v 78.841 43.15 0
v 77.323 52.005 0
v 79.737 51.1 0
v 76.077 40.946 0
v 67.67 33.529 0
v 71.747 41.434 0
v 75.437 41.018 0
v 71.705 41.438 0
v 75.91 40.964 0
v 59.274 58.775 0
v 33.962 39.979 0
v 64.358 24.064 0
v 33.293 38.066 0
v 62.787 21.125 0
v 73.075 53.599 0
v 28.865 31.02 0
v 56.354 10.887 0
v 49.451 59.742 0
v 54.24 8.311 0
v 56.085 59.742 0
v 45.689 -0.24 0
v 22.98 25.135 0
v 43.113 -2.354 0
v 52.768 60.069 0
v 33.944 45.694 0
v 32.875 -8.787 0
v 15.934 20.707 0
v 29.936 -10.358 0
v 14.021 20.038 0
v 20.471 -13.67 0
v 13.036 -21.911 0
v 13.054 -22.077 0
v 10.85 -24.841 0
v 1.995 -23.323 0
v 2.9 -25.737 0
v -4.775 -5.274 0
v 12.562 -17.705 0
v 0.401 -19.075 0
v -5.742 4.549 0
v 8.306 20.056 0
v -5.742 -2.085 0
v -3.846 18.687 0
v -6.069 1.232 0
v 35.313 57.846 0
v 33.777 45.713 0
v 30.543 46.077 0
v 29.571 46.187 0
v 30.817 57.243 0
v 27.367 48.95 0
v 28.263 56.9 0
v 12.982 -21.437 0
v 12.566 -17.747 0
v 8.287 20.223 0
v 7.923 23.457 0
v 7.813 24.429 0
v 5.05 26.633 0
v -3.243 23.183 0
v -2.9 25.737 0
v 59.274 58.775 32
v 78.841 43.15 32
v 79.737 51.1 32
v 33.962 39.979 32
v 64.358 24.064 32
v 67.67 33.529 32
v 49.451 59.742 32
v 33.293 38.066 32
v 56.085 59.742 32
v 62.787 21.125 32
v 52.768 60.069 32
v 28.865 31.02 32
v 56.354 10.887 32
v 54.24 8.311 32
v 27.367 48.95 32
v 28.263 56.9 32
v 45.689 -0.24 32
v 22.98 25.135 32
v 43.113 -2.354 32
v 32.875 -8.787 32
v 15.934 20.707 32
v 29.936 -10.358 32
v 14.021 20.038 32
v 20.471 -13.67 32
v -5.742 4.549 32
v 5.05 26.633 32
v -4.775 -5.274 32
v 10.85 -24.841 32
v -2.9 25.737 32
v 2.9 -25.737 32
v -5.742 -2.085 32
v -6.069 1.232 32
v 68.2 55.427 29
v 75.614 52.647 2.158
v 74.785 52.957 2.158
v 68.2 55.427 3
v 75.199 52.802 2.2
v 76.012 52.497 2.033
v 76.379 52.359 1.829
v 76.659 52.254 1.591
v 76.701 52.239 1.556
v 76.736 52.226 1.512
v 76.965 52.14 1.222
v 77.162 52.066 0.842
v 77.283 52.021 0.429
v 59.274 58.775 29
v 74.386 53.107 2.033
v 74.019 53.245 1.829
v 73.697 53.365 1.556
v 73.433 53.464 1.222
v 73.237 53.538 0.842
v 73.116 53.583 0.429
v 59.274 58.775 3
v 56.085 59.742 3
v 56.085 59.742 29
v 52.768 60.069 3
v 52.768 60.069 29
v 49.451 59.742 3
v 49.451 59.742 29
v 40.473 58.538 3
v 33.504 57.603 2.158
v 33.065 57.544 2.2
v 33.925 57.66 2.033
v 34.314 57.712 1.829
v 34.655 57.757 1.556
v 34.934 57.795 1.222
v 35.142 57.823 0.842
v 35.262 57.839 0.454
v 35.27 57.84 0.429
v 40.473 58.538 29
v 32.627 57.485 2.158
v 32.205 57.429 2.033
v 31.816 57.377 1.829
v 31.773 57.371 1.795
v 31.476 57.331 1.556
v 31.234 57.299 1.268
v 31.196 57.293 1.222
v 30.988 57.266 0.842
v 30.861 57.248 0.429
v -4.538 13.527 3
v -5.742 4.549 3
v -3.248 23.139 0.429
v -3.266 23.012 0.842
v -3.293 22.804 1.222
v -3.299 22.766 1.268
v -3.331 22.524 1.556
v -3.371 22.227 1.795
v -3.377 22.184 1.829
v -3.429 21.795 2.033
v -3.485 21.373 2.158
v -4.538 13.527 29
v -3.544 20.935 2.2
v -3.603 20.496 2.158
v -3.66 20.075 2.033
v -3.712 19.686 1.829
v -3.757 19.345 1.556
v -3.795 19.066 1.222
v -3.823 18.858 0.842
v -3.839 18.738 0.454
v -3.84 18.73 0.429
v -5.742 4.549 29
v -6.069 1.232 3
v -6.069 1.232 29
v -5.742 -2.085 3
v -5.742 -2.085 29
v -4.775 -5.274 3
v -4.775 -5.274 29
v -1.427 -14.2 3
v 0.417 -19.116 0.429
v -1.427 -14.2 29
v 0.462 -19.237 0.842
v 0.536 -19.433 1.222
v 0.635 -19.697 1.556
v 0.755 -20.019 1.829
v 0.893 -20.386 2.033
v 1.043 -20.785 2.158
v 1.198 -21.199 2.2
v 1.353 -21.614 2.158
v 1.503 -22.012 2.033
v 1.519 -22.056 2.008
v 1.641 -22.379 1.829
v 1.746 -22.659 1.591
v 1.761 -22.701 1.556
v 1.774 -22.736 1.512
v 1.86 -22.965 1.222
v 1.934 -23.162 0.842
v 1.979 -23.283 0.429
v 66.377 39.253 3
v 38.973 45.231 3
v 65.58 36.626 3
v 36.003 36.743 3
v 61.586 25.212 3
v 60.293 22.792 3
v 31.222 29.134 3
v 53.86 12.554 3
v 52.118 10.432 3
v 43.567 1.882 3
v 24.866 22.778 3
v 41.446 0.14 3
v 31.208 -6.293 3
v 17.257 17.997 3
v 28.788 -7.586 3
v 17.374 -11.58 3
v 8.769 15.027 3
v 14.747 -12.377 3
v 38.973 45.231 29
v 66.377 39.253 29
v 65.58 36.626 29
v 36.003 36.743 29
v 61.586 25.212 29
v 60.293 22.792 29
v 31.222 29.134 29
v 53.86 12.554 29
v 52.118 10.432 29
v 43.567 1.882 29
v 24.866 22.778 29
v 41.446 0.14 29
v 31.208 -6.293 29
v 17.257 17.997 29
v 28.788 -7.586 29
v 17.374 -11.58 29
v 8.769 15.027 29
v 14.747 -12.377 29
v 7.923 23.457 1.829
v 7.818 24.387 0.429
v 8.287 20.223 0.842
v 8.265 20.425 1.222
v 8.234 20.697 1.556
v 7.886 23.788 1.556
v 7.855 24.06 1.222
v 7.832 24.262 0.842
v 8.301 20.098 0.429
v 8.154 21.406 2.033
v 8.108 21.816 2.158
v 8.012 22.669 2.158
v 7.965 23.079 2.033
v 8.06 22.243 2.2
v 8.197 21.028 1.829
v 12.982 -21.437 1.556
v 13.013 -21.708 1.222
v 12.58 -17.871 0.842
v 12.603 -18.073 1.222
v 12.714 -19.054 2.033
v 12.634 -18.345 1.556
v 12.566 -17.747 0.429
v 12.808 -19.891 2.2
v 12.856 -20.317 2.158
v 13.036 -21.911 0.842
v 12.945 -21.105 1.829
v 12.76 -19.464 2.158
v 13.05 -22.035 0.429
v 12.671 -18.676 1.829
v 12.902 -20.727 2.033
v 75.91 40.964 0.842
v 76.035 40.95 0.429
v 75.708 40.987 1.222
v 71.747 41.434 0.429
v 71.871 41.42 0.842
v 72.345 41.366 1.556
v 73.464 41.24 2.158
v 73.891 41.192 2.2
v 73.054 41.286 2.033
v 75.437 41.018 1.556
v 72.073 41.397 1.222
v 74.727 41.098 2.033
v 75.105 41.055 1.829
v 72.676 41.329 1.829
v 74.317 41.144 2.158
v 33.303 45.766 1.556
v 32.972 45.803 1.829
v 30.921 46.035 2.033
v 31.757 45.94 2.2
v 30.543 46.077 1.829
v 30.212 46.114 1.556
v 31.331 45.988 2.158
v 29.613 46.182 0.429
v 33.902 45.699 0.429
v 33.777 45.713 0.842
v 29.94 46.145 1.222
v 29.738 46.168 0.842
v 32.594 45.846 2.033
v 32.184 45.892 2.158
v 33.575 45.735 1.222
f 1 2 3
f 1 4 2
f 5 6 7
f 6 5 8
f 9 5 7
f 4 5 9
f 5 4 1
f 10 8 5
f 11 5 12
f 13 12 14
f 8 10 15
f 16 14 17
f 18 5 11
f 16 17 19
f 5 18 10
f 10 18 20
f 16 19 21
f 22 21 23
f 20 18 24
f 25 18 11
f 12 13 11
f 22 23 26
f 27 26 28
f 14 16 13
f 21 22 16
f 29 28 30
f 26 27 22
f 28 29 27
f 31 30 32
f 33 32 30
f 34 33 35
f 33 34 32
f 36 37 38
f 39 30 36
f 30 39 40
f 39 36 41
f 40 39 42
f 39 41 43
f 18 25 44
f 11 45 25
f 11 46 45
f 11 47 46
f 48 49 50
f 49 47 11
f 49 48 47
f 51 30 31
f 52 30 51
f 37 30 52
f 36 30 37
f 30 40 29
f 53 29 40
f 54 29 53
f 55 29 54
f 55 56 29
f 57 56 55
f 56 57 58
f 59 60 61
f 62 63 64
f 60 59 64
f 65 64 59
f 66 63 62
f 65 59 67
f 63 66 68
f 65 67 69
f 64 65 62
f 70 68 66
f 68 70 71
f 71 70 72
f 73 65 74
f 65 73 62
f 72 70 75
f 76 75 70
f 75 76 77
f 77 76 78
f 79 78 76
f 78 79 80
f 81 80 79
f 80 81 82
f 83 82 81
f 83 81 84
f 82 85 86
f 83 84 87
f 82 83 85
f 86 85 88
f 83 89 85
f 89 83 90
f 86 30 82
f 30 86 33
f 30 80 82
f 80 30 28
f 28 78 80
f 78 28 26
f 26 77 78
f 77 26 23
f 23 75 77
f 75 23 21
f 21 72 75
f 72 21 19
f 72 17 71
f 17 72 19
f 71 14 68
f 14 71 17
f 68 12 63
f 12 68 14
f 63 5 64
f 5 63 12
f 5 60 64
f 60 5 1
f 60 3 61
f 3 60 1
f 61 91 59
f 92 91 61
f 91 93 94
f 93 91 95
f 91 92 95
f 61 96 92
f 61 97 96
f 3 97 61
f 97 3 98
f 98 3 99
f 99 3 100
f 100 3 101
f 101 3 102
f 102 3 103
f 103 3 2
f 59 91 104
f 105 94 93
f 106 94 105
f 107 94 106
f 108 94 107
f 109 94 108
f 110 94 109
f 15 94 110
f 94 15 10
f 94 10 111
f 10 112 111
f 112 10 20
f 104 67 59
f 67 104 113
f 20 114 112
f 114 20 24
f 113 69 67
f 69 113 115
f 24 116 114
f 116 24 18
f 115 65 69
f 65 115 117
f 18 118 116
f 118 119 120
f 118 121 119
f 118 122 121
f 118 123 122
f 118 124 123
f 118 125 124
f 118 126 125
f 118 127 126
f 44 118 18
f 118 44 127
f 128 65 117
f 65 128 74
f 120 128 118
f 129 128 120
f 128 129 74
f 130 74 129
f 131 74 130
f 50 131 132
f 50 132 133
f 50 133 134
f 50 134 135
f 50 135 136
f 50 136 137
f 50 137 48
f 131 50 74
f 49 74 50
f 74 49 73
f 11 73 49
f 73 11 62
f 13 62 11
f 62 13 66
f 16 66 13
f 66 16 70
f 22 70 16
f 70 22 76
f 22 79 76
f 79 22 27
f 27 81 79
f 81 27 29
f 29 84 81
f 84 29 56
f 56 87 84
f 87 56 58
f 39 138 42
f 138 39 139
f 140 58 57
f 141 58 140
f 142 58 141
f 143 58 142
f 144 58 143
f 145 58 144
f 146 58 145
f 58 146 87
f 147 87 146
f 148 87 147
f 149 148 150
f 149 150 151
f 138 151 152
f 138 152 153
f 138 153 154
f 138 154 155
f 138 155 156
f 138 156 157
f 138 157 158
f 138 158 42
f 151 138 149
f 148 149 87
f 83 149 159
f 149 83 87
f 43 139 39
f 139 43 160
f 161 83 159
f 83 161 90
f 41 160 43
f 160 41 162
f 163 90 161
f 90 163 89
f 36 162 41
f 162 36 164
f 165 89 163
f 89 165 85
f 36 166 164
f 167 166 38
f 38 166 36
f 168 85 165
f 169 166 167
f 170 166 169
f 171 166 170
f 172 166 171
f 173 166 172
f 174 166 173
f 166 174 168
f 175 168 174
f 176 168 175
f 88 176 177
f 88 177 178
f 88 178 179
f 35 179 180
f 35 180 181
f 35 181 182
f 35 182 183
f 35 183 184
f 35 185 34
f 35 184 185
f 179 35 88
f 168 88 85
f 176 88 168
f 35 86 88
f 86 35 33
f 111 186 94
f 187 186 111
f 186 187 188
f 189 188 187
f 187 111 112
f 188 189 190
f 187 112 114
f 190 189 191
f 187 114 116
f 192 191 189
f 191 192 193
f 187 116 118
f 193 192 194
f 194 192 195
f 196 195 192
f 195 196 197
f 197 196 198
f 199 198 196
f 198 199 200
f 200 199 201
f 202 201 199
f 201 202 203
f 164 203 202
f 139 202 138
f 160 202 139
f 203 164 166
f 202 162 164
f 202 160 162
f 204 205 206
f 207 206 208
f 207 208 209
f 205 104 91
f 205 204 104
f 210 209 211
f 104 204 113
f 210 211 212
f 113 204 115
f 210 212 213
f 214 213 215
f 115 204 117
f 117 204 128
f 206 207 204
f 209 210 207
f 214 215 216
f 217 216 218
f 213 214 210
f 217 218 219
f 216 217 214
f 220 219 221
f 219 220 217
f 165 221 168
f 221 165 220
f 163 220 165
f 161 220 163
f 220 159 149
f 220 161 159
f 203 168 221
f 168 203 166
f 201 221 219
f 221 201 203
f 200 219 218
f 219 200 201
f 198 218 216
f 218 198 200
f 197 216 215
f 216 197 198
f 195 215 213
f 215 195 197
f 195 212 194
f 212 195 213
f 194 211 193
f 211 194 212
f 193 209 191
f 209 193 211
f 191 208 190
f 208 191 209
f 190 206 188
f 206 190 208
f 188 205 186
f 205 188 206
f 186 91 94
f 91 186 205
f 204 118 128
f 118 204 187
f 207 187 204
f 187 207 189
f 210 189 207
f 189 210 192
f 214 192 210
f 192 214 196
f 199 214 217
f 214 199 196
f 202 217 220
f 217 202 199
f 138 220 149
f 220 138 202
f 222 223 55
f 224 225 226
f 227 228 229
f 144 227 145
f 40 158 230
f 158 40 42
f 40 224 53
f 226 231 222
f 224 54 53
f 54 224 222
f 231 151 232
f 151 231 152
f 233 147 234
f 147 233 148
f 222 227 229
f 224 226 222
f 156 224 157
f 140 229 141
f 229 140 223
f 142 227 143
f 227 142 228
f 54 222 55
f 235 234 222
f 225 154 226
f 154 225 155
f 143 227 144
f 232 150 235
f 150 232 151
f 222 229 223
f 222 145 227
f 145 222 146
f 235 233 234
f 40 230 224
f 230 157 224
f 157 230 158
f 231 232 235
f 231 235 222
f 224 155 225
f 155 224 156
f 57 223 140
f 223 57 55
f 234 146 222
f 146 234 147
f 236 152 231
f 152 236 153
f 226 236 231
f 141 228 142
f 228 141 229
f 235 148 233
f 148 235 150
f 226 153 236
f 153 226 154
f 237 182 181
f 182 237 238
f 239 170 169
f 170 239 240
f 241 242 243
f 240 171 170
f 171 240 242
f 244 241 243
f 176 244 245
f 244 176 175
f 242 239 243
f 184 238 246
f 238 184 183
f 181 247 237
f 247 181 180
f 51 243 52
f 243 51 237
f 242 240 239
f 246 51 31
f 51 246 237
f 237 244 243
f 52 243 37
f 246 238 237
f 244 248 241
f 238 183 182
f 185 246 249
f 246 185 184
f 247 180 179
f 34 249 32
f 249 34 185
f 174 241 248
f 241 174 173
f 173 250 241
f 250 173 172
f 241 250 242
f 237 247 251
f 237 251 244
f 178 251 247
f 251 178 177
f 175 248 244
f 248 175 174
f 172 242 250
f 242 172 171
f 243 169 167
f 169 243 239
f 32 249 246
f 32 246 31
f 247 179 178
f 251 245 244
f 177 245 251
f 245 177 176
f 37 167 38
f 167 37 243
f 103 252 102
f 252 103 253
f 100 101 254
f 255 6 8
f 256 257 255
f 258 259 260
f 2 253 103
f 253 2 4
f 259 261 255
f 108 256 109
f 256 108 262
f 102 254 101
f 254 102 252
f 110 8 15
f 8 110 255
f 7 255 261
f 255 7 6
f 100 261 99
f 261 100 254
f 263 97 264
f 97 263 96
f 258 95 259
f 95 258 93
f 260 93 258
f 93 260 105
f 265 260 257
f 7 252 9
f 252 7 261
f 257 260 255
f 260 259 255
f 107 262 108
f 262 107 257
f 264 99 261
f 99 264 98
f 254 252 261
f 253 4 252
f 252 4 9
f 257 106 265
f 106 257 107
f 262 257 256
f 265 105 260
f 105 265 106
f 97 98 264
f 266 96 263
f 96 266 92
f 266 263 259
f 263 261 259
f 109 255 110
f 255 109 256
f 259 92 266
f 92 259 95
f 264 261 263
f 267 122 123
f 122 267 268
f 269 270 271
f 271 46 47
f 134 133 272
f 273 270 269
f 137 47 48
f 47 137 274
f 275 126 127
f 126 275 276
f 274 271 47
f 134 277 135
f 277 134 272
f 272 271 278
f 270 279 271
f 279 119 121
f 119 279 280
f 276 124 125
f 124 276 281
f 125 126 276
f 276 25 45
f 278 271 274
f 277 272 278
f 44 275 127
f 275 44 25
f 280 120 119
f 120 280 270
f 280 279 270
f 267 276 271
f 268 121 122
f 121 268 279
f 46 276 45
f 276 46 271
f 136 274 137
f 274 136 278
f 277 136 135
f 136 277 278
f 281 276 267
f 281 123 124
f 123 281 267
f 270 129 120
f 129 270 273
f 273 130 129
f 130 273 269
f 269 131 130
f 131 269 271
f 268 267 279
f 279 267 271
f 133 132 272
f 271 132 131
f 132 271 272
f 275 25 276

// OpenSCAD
$fn = 32;

// ----------------------------------------------------------------------
// Air duct: 34 mm duct, 3 mm wall, 32 mm across
// ----------------------------------------------------------------------

// --- parameters (mm) ---
duct_r = 17;              // duct core radius
duct_d = 34;              // duct core diameter
wall = 3;                 // duct wall thickness
height = 32;              // duct width (extrusion height)
port_r = 25.9;            // port flange half width
port_d = 51.8;            // port flange width
port_t = 8;               // port flange thickness
bolt_d = 4.4;             // port bolt holes
bolt_offset = 21.2;       // bolt hole offset from the port axis

difference() {
  /* outer hull chain: tube with a flat flange plate at every port */
  linear_extrude(height = 32) {
    hull() {
      polygon([[2.9, -25.737], [-2.9, 25.737], [5.05, 26.633], [10.85, -24.841]]);
      translate([10.931, 1.232]) circle(r = 17);
    }
    hull() {
      translate([10.931, 1.232]) circle(r = 17);
      translate([12.016, 1.354]) circle(r = 17);
    }
    hull() {
      translate([12.016, 1.354]) circle(r = 17);
      translate([23.43, 5.348]) circle(r = 17);
    }
    hull() {
      translate([23.43, 5.348]) circle(r = 17);
      translate([33.668, 11.781]) circle(r = 17);
    }
    hull() {
      translate([33.668, 11.781]) circle(r = 17);
      translate([42.219, 20.332]) circle(r = 17);
    }
    hull() {
      translate([42.219, 20.332]) circle(r = 17);
      translate([48.652, 30.57]) circle(r = 17);
    }
    hull() {
      translate([48.652, 30.57]) circle(r = 17);
      translate([52.646, 41.984]) circle(r = 17);
    }
    hull() {
      translate([52.646, 41.984]) circle(r = 17);
      translate([52.768, 43.069]) circle(r = 17);
    }
    hull() {
      translate([52.768, 43.069]) circle(r = 17);
      polygon([[28.263, 56.9], [79.737, 51.1], [78.841, 43.15], [27.367, 48.95]]);
    }
  }
  /* air passage: the same chain inset by the wall, 5 mm proud of the ports */
  translate([0, 0, 3]) linear_extrude(height = 26) {
    hull() {
      translate([-4.969, -0.56]) circle(r = 14);
      translate([12.016, 1.354]) circle(r = 14);
    }
    hull() {
      translate([12.016, 1.354]) circle(r = 14);
      translate([23.43, 5.348]) circle(r = 14);
    }
    hull() {
      translate([23.43, 5.348]) circle(r = 14);
      translate([33.668, 11.781]) circle(r = 14);
    }
    hull() {
      translate([33.668, 11.781]) circle(r = 14);
      translate([42.219, 20.332]) circle(r = 14);
    }
    hull() {
      translate([42.219, 20.332]) circle(r = 14);
      translate([48.652, 30.57]) circle(r = 14);
    }
    hull() {
      translate([48.652, 30.57]) circle(r = 14);
      translate([52.646, 41.984]) circle(r = 14);
    }
    hull() {
      translate([52.646, 41.984]) circle(r = 14);
      translate([54.56, 58.969]) circle(r = 14);
    }
  }
  translate([0, 0]) rotate([0, 0, -83.57]) translate([-21.2, -2.5]) rotate([-90, 0, 0]) cylinder(h = 13, d = 4.4);
  translate([0, 0]) rotate([0, 0, -83.57]) translate([21.2, -2.5]) rotate([-90, 0, 0]) cylinder(h = 13, d = 4.4);
  translate([54, 54]) rotate([0, 0, 173.57]) translate([-21.2, -2.5]) rotate([-90, 0, 0]) cylinder(h = 13, d = 4.4);
  translate([54, 54]) rotate([0, 0, 173.57]) translate([21.2, -2.5]) rotate([-90, 0, 0]) cylinder(h = 13, d = 4.4);
}
